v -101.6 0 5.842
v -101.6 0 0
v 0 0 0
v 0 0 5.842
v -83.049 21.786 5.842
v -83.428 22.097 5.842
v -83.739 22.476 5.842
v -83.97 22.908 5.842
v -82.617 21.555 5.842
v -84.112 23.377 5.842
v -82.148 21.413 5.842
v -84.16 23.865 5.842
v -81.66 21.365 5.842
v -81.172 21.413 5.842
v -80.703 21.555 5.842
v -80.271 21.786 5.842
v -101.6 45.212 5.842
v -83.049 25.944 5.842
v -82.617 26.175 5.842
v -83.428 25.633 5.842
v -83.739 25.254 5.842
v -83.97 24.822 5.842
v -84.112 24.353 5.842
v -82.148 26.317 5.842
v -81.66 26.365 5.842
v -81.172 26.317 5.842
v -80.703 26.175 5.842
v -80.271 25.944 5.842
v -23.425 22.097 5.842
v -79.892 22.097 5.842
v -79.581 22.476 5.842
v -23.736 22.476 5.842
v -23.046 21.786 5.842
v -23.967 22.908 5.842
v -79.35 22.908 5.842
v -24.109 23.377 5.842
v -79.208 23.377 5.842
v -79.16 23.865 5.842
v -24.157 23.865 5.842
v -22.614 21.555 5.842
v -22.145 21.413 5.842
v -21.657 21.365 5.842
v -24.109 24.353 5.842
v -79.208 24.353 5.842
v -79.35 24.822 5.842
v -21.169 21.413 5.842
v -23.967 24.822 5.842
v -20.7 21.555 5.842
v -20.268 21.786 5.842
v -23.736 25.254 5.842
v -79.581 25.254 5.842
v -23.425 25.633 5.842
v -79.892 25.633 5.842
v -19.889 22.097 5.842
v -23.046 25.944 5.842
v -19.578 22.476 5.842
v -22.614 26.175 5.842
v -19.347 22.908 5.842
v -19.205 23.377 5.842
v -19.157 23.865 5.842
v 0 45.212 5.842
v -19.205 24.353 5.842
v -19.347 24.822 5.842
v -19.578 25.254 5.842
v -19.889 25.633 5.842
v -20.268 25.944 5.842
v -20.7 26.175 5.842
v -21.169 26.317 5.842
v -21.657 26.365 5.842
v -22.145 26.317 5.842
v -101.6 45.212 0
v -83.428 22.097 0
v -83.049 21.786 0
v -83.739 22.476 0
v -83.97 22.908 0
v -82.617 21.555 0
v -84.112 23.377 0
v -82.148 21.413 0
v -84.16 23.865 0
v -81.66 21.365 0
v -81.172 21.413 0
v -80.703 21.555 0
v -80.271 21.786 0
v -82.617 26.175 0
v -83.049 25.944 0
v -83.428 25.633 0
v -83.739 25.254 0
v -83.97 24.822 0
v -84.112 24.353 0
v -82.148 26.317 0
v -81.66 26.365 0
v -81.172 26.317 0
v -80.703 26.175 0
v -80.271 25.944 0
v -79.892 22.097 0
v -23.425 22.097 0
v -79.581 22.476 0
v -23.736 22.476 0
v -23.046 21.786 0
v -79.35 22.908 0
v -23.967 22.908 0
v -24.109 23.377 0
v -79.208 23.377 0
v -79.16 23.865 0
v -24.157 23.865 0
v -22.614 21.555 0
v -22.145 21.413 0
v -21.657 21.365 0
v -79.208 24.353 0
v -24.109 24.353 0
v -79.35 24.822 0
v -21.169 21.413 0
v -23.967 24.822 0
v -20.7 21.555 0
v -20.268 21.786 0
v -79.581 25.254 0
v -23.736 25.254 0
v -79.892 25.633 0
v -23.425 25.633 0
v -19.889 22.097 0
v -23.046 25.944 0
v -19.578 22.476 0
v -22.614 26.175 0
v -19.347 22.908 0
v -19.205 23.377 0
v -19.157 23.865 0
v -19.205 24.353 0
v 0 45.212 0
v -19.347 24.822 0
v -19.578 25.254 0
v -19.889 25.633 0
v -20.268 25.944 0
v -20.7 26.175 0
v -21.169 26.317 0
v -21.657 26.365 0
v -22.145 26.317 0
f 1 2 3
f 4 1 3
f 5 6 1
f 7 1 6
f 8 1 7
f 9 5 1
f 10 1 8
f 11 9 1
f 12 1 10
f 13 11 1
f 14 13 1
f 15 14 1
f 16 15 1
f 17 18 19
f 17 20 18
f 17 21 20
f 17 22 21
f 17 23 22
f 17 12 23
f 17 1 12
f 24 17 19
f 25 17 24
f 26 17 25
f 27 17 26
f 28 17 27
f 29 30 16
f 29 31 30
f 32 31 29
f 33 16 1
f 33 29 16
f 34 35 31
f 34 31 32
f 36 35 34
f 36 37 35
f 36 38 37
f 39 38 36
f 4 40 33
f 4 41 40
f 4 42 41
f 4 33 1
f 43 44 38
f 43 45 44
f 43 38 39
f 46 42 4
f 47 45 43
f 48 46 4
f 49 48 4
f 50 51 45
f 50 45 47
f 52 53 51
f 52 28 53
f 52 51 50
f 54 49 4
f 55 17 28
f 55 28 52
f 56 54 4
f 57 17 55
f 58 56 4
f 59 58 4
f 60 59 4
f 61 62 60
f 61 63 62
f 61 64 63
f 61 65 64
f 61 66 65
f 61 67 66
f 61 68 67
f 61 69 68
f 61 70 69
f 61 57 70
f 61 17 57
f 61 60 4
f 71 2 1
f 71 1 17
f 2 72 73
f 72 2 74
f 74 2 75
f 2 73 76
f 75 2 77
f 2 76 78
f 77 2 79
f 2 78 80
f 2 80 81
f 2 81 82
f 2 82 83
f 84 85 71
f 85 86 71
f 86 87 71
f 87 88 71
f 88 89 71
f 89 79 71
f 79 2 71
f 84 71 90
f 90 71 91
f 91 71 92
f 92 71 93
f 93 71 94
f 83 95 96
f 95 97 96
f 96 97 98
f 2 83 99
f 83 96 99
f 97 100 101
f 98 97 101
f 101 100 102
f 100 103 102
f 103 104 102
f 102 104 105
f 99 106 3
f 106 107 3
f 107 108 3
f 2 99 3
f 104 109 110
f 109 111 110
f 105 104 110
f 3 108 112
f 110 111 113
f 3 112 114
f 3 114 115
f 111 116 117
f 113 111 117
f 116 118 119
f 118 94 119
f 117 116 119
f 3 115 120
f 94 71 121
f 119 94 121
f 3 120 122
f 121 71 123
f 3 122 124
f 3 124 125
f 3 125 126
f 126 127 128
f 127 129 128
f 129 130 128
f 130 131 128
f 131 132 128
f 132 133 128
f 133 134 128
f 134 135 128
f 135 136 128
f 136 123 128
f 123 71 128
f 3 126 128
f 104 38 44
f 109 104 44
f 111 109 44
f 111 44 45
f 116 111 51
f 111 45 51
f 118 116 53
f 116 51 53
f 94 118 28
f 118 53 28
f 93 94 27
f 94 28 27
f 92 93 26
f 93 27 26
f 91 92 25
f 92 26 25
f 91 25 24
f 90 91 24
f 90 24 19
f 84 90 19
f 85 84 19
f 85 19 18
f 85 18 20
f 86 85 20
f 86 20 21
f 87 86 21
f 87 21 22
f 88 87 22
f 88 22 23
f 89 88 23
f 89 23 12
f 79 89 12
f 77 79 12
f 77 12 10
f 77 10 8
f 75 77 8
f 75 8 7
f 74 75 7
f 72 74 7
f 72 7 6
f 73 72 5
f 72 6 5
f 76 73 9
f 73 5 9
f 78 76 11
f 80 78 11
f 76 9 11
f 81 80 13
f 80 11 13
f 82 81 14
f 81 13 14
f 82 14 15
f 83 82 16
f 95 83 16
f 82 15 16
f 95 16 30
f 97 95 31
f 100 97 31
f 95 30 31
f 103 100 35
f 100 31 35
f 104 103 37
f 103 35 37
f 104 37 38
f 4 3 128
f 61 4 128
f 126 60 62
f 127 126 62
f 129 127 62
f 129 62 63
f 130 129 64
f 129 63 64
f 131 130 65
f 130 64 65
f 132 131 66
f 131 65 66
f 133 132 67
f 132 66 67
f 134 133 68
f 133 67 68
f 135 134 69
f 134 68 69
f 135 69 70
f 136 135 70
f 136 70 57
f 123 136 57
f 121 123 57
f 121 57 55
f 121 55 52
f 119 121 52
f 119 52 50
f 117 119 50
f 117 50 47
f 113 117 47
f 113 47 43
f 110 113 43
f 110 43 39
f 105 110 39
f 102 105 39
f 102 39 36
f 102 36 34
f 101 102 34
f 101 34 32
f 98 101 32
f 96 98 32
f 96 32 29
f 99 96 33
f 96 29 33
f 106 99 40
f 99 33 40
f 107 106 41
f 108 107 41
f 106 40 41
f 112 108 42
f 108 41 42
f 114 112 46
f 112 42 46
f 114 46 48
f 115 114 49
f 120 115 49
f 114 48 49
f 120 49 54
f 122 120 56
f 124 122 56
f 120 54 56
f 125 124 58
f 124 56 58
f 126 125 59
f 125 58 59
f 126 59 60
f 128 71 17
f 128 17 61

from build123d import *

# Parameters (mm, degrees)
SKETCH1_W                 = 101.6
SKETCH1_H                 = 45.212
BOSS_EXTRUDE1_DEPTH       = 5.842
M6X1_0_TAPPED_HOLE1_D     = 5
M6X1_0_TAPPED_HOLE1_DEPTH = 14.986
M6X1_0_TAPPED_HOLE1_TIP   = 1.502151548


with BuildPart() as part:
    # Sketch1 → Boss-Extrude1 (new body)
    with BuildSketch(Plane.XY):
        with Locations((-50.8, 22.606)):
            Rectangle(SKETCH1_W, SKETCH1_H)
    extrude(amount=BOSS_EXTRUDE1_DEPTH)

    # M6x1.0 Tapped Hole1
    with Locations(Plane(origin=(-50.8, -38.1, 0), x_dir=(-1, 0, 0), z_dir=(0, 0, -1))):
        with Locations((-29.14300736, 61.964884424), (30.859893074, 61.964884424)):
            Hole(M6X1_0_TAPPED_HOLE1_D / 2, depth=M6X1_0_TAPPED_HOLE1_DEPTH)
            with Locations((0, 0, -(M6X1_0_TAPPED_HOLE1_DEPTH + M6X1_0_TAPPED_HOLE1_TIP / 2))):  # 118° drill point
                Cone(0, M6X1_0_TAPPED_HOLE1_D / 2, M6X1_0_TAPPED_HOLE1_TIP, mode=Mode.SUBTRACT)


solid = part.part
